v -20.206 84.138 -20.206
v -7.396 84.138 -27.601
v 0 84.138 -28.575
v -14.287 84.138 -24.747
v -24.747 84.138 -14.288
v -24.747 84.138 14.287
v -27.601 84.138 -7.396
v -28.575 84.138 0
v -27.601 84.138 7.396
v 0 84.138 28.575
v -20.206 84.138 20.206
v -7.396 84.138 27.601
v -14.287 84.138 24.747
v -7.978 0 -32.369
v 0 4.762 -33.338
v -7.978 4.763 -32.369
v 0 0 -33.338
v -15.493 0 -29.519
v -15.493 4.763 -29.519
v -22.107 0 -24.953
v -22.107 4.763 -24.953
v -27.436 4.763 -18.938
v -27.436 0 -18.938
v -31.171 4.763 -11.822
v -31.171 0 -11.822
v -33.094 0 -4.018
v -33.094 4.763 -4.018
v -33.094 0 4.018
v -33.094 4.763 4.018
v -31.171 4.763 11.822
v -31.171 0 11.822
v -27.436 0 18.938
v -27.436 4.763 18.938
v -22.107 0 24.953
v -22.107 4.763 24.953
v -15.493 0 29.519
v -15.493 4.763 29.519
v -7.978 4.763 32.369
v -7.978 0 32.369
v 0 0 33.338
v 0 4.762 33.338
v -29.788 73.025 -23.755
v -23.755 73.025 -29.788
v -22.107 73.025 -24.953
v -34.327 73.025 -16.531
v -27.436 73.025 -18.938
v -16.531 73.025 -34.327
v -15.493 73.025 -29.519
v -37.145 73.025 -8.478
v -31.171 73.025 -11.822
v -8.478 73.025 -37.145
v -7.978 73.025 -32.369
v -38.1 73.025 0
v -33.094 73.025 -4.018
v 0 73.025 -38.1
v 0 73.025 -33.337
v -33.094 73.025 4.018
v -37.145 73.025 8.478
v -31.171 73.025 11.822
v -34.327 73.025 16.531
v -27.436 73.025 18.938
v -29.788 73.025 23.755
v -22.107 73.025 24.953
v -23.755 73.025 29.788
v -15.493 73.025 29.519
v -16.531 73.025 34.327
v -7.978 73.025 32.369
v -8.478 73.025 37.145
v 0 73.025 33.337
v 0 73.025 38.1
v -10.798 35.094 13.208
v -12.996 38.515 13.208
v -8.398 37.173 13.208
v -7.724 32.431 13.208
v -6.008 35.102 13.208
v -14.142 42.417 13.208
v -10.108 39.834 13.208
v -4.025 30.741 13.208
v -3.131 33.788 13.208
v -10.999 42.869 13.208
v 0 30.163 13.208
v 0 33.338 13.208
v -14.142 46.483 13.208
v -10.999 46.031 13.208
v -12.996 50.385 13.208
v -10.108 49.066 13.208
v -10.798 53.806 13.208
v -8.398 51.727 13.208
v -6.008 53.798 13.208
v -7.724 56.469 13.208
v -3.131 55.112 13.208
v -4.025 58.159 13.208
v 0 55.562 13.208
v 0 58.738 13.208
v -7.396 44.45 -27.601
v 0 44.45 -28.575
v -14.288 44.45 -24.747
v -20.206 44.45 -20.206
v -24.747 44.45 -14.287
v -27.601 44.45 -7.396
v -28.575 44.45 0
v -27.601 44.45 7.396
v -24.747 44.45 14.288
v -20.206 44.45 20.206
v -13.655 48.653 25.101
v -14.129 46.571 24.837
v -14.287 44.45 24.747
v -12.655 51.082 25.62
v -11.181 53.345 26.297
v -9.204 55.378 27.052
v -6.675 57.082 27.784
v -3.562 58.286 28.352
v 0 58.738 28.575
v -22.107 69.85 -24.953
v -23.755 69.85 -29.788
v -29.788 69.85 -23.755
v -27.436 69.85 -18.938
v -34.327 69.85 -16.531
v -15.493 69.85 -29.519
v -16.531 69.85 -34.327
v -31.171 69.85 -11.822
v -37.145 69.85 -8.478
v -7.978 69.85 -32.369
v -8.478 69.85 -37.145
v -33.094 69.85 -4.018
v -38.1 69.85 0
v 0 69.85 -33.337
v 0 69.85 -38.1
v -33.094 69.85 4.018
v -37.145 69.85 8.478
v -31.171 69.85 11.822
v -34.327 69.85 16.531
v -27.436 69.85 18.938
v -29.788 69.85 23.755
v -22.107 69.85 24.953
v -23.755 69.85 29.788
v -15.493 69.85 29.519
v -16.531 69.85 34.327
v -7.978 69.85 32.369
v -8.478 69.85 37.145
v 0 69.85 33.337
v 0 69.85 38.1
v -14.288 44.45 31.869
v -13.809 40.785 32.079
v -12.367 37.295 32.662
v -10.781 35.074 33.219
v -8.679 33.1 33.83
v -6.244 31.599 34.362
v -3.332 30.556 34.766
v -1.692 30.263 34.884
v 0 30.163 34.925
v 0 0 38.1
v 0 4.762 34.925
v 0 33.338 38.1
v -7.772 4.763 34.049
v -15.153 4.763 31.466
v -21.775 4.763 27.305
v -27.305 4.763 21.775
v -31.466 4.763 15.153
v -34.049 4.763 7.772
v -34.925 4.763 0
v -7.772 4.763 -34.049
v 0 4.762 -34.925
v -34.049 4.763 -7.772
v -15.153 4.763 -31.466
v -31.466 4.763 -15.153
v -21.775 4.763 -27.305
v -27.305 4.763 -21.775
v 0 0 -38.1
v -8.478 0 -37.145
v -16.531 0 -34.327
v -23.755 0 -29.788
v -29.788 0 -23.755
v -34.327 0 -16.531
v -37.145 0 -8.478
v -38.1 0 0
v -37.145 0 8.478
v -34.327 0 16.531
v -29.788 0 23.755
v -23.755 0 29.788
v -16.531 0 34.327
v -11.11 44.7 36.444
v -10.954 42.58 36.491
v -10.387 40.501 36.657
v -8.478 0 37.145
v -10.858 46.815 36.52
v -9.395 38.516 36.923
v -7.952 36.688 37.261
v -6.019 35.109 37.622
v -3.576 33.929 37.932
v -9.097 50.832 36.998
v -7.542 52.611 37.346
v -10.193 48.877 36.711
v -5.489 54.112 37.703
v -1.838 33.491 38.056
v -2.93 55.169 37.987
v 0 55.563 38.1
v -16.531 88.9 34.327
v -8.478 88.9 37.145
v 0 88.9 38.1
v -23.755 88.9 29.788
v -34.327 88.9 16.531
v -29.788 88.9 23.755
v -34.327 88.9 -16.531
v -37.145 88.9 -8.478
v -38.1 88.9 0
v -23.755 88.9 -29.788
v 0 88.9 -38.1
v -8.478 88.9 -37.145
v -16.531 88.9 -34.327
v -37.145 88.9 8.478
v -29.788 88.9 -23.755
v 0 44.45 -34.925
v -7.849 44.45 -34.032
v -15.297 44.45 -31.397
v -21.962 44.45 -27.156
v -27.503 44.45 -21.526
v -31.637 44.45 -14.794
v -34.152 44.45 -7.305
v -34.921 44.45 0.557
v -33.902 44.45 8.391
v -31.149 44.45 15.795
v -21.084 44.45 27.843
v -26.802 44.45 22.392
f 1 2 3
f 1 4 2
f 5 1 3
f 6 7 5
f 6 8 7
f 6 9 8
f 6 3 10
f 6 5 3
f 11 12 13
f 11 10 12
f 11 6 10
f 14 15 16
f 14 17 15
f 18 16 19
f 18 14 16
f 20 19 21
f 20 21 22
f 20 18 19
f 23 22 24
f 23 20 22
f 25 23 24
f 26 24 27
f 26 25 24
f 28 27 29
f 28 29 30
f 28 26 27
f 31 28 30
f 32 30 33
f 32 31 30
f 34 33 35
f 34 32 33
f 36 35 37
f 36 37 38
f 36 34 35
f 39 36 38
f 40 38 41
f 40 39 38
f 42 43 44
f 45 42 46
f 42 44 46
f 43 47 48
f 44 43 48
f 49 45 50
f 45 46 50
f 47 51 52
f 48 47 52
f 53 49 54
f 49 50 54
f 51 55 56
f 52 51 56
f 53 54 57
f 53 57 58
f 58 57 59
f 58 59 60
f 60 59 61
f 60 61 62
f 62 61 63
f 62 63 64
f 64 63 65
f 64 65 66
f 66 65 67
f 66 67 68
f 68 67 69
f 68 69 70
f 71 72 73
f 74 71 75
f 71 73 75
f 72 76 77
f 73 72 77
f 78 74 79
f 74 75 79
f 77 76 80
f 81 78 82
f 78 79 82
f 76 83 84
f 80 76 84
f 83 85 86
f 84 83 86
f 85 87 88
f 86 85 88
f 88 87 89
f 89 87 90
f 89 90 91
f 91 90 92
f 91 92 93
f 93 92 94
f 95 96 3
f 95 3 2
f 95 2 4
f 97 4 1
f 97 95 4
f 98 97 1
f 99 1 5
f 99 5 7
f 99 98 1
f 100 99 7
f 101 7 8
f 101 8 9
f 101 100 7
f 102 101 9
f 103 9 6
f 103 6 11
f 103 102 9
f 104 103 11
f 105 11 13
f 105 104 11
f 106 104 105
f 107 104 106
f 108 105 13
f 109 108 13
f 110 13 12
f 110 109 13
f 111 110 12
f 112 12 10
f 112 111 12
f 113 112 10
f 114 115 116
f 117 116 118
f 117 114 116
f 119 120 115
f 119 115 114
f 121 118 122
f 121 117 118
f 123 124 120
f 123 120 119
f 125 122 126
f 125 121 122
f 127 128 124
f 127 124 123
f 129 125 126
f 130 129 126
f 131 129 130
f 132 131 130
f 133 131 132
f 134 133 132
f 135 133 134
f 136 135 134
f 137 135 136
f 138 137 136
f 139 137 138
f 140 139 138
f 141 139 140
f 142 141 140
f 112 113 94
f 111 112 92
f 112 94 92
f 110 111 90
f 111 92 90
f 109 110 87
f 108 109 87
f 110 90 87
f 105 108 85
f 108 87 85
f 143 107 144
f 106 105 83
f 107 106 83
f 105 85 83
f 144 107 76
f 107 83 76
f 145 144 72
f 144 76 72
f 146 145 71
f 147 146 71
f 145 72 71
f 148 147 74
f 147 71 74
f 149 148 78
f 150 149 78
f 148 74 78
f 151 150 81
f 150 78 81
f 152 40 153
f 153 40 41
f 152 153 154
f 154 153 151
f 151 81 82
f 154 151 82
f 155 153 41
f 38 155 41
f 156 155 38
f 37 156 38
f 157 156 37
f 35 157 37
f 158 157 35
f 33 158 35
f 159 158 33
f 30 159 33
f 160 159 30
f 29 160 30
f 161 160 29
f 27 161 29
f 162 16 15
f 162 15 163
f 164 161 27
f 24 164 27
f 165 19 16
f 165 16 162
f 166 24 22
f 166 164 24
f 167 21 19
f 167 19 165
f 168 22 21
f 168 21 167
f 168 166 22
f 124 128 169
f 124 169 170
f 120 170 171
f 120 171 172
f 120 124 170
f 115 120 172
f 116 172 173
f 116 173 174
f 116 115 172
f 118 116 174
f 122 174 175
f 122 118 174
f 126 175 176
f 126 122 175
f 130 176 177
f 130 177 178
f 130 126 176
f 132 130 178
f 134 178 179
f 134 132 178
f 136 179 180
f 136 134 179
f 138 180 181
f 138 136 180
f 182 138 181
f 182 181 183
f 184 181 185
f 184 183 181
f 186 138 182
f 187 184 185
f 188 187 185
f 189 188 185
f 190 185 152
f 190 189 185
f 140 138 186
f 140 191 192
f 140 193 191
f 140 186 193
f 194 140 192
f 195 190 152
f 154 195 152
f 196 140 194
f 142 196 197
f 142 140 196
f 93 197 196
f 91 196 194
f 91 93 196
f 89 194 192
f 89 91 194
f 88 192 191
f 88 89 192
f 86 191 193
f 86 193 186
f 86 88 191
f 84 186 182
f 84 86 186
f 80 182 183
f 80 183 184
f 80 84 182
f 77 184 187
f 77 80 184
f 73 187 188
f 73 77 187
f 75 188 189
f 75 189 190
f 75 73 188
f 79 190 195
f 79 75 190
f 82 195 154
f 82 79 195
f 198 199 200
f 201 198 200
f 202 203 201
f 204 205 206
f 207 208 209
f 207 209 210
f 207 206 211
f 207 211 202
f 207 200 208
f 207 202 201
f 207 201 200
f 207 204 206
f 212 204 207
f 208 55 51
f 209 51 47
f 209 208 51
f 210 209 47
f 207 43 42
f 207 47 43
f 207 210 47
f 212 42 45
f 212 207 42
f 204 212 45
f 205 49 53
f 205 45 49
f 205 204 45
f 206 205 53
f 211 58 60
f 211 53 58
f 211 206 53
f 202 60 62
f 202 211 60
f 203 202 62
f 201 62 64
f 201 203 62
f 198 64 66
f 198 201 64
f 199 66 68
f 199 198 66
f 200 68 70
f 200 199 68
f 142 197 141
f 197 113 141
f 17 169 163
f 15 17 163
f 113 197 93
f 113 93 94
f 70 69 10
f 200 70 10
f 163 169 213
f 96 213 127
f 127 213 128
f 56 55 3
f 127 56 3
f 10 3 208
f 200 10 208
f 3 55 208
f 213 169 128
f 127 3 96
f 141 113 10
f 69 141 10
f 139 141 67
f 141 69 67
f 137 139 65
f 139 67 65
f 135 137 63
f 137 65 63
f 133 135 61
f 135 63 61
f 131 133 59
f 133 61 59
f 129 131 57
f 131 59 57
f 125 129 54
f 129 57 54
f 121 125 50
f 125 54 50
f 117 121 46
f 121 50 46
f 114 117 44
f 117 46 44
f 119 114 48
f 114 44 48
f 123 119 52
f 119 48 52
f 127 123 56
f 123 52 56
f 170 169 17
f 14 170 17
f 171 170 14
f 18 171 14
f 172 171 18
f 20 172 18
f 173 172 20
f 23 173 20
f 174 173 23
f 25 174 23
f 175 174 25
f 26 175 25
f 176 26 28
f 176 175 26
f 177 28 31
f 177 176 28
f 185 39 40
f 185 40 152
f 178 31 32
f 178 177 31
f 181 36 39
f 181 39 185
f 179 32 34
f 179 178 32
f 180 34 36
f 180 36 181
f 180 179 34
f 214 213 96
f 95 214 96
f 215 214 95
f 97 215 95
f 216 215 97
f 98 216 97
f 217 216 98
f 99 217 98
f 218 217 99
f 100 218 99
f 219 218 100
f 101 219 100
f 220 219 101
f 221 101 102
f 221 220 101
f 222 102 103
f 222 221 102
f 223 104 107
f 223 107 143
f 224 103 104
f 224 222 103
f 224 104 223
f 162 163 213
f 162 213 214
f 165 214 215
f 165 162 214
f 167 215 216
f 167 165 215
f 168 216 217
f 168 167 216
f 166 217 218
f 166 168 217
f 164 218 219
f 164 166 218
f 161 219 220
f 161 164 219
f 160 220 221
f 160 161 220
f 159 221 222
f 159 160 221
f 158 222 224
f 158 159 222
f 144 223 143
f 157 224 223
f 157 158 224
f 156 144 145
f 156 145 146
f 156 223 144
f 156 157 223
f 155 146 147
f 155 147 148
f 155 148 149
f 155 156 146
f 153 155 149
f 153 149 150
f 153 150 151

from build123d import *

# Parameters (mm, degrees)
MAIN_ANGLE          = 180
CIRCULAR_BOSS_REACH = 111.487
SKETCH6_R           = 11.1125
CIRCULAR_CUT_DEPTH  = 110.4866698
SKETCH7_W           = 4.7625
SKETCH7_H           = 3.175


with BuildPart() as part:
    # Sketch1 → Main (revolve)
    with BuildSketch(Plane(origin=(0, 0, 0), x_dir=(0, 0, -1), z_dir=(1, 0, 0))):
        Polygon((38.1, 88.9), (0, 88.9), (0, 84.1375), (28.575, 84.1375), (28.575, 44.45), (34.925, 44.45), (34.925, 4.7625), (33.3375, 4.7625), (33.3375, 0), (38.1, 0), align=None)
    revolve(axis=Axis((0, 88.9, 0), (0, 1, 0)), revolution_arc=MAIN_ANGLE)

    # Sketch5 → Circular Boss (add, up to next)
    with BuildSketch(Plane.XY.offset(13.208), mode=Mode.PRIVATE) as circular_boss_sk1:
        with BuildLine():
            Line((0, 30.1625), (0, 58.7375))
            ThreePointArc((0, 58.7375), (-14.2875, 44.45), (0, 30.1625))
        make_face()
    circular_boss_tool1 = extrude(circular_boss_sk1.sketch, amount=CIRCULAR_BOSS_REACH, mode=Mode.PRIVATE) - part.part
    add(circular_boss_tool1.solids().sort_by_distance((-6.063803, 44.45, 13.208))[0])

    # Sketch6 → Circular Cut (cut, through all)
    with BuildSketch(Plane.XY.offset(13.208)):
        with Locations((0, 44.45)):
            Circle(SKETCH6_R)
    extrude(amount=CIRCULAR_CUT_DEPTH, mode=Mode.SUBTRACT)

    # Sketch7 → Cut-Revolve1 (revolve, cut)
    with BuildSketch(Plane(origin=(0, 7.447290845, 55.242674731), x_dir=(0, 0, -1), z_dir=(1, 0, 0))):
        with Locations((90.961424731, 63.990209155)):
            Rectangle(SKETCH7_W, SKETCH7_H)
    revolve(axis=Axis((0, 73.025, 0), (0, -1, 0)), mode=Mode.SUBTRACT)


solid = part.part
